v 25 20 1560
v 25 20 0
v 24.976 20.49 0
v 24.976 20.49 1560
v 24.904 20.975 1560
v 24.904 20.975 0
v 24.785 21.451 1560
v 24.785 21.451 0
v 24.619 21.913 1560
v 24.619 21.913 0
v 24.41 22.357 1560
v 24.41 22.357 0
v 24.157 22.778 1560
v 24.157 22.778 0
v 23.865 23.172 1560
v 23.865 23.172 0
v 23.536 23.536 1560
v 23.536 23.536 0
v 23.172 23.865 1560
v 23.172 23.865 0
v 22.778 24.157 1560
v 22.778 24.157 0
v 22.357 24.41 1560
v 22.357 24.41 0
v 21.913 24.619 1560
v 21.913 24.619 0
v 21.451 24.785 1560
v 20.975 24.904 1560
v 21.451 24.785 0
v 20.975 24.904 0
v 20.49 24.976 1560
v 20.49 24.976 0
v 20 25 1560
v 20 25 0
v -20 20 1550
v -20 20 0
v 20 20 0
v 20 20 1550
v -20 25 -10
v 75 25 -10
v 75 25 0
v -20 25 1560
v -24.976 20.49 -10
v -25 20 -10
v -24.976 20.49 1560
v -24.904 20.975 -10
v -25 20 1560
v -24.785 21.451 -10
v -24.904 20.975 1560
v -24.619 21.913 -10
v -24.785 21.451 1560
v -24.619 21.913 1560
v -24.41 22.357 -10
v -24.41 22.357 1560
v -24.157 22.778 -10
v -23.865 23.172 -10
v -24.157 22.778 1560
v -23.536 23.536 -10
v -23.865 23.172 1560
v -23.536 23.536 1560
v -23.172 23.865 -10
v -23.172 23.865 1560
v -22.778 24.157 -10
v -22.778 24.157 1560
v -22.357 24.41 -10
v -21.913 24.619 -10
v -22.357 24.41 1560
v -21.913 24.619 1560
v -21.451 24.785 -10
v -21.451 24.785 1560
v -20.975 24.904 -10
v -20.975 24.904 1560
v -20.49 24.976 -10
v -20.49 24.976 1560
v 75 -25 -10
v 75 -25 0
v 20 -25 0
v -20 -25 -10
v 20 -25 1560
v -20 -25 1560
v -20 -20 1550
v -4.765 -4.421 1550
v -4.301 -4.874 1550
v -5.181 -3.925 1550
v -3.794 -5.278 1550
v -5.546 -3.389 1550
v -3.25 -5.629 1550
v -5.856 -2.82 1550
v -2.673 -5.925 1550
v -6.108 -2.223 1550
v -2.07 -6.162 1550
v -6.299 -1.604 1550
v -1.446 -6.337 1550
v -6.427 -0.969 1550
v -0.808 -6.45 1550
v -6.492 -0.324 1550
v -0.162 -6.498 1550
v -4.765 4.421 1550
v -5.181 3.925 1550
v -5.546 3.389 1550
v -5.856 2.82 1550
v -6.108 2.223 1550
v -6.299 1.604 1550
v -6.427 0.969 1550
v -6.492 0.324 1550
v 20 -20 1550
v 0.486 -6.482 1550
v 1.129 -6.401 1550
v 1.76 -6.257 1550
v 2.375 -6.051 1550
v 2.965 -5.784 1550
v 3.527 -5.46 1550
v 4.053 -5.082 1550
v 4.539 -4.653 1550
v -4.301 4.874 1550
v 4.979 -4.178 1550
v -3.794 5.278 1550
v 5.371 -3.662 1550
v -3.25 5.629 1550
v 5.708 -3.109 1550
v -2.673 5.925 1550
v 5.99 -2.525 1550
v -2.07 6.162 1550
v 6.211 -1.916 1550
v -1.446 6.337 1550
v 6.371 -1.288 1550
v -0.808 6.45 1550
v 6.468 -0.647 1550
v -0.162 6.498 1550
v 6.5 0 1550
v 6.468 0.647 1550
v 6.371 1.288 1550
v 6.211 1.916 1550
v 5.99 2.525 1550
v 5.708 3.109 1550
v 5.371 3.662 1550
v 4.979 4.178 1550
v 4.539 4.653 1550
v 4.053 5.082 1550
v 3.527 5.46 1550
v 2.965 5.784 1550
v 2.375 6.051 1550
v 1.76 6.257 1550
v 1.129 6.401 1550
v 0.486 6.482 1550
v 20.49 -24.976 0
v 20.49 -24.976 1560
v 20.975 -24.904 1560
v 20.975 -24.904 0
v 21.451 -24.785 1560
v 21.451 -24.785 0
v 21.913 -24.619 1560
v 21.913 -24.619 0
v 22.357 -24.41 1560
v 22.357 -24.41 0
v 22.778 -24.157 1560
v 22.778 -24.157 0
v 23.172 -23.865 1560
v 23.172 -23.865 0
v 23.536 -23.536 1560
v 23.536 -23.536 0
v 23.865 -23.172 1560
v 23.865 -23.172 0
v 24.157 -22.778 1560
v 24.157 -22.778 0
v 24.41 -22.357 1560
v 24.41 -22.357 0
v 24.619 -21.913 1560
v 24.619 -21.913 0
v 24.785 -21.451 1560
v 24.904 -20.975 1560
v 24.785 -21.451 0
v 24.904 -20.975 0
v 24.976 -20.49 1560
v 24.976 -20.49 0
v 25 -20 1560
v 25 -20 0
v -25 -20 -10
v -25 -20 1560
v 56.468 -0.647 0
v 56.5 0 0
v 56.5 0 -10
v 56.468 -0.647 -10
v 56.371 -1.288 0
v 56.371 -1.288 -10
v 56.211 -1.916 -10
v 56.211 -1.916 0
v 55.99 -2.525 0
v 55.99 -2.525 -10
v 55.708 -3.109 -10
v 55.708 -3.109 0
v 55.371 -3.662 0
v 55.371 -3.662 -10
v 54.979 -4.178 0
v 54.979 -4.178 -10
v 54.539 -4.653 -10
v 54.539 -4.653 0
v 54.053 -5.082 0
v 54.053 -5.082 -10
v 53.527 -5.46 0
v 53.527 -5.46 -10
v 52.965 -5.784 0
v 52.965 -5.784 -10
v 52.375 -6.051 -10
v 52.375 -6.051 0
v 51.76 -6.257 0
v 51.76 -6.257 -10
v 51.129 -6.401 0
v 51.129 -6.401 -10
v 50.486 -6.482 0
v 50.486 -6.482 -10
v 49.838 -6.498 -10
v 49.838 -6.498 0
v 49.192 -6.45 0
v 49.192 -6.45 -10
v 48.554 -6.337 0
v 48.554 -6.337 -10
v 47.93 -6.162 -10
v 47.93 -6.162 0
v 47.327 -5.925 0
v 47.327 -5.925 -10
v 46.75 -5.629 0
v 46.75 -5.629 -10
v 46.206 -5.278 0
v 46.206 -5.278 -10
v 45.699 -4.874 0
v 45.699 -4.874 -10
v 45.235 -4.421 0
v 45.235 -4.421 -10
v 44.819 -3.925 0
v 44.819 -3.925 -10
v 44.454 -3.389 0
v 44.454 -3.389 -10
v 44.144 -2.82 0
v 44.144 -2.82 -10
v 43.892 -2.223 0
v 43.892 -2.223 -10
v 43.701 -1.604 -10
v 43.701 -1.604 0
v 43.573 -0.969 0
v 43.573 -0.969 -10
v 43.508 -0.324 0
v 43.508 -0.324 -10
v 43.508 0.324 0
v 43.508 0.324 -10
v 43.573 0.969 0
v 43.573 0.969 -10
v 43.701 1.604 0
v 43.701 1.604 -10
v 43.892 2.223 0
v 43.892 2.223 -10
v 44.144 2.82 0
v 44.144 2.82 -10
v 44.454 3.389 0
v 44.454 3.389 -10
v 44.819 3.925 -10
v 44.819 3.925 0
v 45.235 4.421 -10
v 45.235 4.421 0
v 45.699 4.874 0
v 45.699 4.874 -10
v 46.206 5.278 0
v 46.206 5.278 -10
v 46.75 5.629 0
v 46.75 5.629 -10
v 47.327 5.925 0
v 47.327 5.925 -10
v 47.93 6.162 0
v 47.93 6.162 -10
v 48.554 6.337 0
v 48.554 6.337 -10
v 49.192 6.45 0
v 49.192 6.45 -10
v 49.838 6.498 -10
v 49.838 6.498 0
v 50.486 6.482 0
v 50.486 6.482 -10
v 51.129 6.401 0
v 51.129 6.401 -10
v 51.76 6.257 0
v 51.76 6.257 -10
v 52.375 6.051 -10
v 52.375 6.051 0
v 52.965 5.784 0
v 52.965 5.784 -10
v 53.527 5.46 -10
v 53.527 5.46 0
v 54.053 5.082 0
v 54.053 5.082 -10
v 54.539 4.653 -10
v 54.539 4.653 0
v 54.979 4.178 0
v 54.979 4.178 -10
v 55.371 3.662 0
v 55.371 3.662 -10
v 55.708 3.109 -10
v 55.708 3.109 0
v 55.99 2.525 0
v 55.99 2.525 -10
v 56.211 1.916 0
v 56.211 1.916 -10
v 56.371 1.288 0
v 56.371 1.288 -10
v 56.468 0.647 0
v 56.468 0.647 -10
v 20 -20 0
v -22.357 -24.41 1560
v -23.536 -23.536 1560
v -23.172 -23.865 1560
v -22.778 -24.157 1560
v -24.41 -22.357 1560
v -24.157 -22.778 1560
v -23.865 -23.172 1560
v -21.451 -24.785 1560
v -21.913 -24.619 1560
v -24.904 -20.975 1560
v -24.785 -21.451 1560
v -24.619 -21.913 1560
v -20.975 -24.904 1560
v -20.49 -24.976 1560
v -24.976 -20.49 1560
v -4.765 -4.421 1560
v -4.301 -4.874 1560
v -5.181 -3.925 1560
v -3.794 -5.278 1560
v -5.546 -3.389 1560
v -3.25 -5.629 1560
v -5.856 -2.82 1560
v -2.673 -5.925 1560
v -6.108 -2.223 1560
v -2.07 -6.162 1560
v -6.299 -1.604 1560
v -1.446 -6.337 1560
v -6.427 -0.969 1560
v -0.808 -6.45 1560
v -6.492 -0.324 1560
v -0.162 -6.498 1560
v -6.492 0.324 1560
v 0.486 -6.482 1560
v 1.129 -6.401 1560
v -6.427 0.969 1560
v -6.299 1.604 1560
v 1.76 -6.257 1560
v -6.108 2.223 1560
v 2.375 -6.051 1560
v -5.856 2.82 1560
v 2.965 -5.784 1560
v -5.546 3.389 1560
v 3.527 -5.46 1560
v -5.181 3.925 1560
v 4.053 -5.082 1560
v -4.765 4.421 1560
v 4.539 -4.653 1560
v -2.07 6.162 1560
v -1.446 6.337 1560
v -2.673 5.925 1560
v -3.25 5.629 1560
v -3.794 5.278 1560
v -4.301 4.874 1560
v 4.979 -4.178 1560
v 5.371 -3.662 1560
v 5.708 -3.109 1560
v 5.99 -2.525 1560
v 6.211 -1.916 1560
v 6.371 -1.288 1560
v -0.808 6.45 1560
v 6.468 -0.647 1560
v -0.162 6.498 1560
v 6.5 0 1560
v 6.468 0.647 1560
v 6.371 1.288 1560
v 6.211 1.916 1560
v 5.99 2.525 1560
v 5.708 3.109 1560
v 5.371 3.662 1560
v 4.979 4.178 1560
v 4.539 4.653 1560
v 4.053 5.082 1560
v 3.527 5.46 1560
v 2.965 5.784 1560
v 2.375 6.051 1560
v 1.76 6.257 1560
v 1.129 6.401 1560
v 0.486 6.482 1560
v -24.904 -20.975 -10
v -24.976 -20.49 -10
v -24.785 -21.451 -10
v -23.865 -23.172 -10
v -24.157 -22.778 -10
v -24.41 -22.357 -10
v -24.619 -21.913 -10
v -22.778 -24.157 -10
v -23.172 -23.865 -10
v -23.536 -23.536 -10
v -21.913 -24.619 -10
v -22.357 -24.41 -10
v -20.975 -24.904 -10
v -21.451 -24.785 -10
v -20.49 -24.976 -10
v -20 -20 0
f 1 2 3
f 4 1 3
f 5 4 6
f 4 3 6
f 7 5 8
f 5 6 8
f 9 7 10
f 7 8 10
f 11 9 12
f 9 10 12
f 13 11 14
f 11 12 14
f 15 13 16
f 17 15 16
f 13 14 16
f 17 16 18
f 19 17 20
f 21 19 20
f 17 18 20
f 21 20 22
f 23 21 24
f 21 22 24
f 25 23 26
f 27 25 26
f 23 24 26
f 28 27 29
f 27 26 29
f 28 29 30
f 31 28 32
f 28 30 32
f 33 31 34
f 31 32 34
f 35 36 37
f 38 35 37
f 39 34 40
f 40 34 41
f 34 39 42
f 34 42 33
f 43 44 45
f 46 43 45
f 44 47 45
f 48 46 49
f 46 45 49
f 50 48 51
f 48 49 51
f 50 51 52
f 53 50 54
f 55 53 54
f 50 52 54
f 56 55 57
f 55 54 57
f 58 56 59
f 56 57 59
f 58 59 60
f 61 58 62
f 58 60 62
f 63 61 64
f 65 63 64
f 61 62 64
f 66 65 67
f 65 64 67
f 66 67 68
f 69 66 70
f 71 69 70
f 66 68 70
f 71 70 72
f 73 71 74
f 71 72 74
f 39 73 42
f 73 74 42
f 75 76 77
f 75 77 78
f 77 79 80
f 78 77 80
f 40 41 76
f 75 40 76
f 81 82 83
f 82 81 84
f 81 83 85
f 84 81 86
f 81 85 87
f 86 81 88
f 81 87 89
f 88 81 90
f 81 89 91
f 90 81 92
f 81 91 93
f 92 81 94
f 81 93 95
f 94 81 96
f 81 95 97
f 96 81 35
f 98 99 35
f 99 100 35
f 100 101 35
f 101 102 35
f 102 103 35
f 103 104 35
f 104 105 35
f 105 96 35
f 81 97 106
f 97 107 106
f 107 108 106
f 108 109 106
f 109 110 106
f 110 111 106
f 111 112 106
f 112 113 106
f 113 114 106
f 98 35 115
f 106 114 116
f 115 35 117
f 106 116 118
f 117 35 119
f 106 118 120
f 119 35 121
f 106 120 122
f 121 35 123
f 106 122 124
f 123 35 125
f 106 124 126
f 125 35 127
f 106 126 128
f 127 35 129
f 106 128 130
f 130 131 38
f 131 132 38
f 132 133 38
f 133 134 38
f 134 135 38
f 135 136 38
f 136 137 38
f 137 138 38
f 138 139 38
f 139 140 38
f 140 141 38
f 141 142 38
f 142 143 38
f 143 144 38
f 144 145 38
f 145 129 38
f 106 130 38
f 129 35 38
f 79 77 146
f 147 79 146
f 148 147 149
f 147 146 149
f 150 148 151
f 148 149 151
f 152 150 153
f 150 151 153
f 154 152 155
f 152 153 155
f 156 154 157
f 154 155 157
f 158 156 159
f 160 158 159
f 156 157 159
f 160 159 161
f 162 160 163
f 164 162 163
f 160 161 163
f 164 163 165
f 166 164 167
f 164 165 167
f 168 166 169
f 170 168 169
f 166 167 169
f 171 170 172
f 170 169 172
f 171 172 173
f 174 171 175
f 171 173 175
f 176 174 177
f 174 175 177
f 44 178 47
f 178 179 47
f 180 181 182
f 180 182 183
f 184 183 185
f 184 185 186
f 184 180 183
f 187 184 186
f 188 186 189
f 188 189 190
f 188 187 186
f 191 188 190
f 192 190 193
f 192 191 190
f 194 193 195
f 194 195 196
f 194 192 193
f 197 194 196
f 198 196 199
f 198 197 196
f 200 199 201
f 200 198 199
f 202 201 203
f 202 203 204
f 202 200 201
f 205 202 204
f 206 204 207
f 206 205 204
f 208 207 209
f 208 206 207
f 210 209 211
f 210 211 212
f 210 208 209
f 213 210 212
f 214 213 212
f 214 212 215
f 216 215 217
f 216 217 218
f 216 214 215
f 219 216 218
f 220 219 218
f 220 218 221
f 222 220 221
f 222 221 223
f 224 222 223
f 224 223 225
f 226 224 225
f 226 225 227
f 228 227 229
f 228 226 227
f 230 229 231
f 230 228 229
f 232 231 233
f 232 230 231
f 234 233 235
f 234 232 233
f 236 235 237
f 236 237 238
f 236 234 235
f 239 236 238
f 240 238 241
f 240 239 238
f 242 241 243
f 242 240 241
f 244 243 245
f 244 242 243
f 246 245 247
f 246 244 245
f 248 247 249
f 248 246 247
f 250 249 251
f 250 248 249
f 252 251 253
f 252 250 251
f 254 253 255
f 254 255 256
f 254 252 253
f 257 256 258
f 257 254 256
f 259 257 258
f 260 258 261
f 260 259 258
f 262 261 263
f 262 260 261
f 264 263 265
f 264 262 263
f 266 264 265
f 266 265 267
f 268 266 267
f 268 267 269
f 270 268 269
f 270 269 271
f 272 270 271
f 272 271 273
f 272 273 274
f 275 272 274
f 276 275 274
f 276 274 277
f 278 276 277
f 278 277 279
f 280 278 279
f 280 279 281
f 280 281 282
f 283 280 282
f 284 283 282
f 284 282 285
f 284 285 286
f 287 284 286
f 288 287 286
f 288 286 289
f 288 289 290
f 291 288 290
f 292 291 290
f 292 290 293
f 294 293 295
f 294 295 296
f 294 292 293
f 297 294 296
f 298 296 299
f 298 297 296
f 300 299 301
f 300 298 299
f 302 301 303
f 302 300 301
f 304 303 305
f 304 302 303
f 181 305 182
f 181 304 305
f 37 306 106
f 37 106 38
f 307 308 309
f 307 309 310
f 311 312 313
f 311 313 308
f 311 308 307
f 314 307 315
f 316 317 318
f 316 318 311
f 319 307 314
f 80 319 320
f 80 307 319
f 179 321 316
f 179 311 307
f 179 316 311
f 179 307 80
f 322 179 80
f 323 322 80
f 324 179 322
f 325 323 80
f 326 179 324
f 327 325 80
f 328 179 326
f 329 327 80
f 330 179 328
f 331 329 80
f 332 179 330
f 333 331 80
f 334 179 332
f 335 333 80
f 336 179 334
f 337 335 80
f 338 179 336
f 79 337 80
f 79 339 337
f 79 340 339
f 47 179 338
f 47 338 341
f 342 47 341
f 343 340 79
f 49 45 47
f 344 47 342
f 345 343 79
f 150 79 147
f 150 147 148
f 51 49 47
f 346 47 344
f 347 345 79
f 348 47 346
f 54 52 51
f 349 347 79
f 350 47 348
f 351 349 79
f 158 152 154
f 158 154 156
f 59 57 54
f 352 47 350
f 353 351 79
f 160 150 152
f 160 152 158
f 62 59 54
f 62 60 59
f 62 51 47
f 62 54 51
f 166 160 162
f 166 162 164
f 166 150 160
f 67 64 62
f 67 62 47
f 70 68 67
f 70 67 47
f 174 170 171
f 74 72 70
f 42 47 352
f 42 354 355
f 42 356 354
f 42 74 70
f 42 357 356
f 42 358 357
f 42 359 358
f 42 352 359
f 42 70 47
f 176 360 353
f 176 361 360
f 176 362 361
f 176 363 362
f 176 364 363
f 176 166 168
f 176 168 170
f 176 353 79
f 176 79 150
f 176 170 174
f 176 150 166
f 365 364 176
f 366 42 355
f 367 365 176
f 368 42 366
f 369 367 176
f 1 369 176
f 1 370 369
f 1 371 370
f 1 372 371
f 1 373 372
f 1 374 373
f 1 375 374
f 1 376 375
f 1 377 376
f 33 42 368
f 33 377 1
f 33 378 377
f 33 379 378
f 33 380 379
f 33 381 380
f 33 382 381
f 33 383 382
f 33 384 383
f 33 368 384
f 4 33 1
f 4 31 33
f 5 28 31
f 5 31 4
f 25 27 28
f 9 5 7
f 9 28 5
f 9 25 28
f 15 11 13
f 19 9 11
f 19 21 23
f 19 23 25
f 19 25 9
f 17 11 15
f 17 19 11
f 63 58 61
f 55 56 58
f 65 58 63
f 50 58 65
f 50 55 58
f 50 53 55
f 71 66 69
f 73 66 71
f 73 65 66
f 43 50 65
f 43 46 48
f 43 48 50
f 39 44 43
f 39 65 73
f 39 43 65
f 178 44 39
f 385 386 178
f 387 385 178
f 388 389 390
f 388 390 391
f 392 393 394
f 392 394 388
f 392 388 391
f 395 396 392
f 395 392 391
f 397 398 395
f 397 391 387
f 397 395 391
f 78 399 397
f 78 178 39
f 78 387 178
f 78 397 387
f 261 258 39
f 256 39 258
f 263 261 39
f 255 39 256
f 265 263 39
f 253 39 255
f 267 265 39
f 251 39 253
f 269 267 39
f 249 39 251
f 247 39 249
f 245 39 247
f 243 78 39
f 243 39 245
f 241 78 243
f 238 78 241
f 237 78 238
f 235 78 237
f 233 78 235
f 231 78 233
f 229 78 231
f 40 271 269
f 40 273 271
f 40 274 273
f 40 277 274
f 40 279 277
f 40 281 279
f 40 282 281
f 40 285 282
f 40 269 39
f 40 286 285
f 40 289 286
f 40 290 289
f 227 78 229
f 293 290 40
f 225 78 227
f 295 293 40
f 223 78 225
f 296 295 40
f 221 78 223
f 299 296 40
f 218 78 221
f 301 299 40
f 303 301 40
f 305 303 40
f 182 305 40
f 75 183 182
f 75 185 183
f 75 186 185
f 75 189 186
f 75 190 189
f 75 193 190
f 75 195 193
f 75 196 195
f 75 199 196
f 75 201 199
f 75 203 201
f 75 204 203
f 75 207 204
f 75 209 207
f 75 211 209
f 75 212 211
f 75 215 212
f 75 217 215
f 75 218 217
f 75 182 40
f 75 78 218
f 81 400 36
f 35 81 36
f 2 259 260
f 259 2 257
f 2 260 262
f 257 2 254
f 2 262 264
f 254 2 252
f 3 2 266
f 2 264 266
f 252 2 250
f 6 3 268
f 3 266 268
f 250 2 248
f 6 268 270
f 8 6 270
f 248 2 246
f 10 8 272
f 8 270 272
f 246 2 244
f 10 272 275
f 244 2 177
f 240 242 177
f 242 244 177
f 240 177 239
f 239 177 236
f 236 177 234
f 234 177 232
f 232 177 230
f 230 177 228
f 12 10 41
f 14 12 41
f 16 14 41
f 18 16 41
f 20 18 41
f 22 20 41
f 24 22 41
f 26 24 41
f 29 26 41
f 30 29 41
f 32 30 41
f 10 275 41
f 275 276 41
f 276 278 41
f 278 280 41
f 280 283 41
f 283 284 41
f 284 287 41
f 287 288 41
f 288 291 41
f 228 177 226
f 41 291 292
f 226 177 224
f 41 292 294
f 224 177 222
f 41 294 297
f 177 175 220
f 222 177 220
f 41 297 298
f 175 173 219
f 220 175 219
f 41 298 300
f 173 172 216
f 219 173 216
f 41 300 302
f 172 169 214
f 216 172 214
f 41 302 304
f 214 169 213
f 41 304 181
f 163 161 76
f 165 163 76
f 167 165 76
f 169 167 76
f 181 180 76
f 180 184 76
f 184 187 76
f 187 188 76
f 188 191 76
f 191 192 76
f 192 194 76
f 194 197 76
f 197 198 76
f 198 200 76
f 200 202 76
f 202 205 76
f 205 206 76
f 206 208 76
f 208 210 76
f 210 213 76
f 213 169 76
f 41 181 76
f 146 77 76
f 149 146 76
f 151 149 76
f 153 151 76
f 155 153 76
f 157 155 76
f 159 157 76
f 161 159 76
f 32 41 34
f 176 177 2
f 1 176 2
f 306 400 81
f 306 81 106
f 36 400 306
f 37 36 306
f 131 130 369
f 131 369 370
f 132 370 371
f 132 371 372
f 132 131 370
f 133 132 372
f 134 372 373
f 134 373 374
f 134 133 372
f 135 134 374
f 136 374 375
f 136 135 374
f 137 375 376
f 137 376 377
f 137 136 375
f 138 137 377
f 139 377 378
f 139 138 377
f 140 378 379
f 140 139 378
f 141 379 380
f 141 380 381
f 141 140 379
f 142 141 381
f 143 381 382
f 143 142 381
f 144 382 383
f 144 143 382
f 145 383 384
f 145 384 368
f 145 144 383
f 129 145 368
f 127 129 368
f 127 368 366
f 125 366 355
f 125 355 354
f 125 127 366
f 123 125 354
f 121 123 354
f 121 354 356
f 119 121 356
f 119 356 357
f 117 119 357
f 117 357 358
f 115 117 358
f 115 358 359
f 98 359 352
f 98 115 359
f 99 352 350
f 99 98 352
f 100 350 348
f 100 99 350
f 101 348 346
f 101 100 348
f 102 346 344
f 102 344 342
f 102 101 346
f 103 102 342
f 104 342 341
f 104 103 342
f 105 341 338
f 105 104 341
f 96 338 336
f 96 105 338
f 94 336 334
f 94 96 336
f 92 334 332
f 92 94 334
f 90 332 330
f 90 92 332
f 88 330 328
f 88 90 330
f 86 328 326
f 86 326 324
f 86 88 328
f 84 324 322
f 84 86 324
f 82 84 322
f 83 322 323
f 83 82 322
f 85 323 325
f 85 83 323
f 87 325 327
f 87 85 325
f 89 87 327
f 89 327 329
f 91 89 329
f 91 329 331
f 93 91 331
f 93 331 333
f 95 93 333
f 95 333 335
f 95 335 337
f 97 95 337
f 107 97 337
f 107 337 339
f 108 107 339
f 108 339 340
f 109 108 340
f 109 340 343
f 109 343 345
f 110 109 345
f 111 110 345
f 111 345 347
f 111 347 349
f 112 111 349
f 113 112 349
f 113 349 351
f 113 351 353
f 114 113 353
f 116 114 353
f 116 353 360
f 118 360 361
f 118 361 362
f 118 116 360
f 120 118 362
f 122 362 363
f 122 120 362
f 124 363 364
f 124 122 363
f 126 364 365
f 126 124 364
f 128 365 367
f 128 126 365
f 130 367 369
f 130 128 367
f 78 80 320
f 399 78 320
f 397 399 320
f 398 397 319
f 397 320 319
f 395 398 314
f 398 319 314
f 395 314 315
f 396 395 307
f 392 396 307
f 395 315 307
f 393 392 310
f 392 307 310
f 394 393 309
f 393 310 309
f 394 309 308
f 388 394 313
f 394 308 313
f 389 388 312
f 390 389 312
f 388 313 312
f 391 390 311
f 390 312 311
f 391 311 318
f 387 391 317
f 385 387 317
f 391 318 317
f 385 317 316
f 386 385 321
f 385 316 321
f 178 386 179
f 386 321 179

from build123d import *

# Parameters (mm, degrees)
F0_W     = 40
F0_H     = 40
F1_DEPTH = 1550
F2_R     = 6.5
F3_DEPTH = 10
F4_R     = 6.5
F5_DEPTH = 10


with BuildPart() as f1:
    # F0 (on Top) → F1 (new body)
    with BuildSketch(Plane.XY):
        with BuildLine():
            Line((-20, -25), (20, -25))
            ThreePointArc((20, -25), (23.535534, -23.535534), (25, -20))
            Line((25, -20), (25, 20))
            ThreePointArc((25, 20), (23.535534, 23.535534), (20, 25))
            Line((20, 25), (-20, 25))
            ThreePointArc((-20, 25), (-23.535534, 23.535534), (-25, 20))
            Line((-25, 20), (-25, -20))
            ThreePointArc((-25, -20), (-23.535534, -23.535534), (-20, -25))
        make_face()
        Rectangle(F0_W, F0_H, mode=Mode.SUBTRACT)
    extrude(amount=F1_DEPTH)

    # F2 (on face) → F3 (join)
    with BuildSketch(Plane.XY.offset(1550)):
        with BuildLine():
            Line((20, 25), (-20, 25))
            ThreePointArc((-20, 25), (-23.535534, 23.535534), (-25, 20))
            Line((-25, 20), (-25, -20))
            ThreePointArc((-25, -20), (-23.535534, -23.535534), (-20, -25))
            Line((-20, -25), (20, -25))
            ThreePointArc((20, -25), (23.535534, -23.535534), (25, -20))
            Line((25, -20), (25, 20))
            ThreePointArc((25, 20), (23.535534, 23.535534), (20, 25))
        make_face()
        Circle(F2_R, mode=Mode.SUBTRACT)
    extrude(amount=F3_DEPTH)

    # F4 (on face) → F5 (join)
    with BuildSketch(Plane(origin=(0, 0, 0), x_dir=(1, 0, 0), z_dir=(0, 0, -1))):
        with BuildLine():
            ThreePointArc((-20, 25), (-23.535534, 23.535534), (-25, 20))
            Line((-25, 20), (-25, -20))
            ThreePointArc((-25, -20), (-23.535534, -23.535534), (-20, -25))
            Line((-20, -25), (75, -25))
            Line((75, -25), (75, 25))
            Line((75, 25), (-20, 25))
        make_face()
        with Locations((50, 0)):
            Circle(F4_R, mode=Mode.SUBTRACT)
    extrude(amount=F5_DEPTH)


solid = f1.part
